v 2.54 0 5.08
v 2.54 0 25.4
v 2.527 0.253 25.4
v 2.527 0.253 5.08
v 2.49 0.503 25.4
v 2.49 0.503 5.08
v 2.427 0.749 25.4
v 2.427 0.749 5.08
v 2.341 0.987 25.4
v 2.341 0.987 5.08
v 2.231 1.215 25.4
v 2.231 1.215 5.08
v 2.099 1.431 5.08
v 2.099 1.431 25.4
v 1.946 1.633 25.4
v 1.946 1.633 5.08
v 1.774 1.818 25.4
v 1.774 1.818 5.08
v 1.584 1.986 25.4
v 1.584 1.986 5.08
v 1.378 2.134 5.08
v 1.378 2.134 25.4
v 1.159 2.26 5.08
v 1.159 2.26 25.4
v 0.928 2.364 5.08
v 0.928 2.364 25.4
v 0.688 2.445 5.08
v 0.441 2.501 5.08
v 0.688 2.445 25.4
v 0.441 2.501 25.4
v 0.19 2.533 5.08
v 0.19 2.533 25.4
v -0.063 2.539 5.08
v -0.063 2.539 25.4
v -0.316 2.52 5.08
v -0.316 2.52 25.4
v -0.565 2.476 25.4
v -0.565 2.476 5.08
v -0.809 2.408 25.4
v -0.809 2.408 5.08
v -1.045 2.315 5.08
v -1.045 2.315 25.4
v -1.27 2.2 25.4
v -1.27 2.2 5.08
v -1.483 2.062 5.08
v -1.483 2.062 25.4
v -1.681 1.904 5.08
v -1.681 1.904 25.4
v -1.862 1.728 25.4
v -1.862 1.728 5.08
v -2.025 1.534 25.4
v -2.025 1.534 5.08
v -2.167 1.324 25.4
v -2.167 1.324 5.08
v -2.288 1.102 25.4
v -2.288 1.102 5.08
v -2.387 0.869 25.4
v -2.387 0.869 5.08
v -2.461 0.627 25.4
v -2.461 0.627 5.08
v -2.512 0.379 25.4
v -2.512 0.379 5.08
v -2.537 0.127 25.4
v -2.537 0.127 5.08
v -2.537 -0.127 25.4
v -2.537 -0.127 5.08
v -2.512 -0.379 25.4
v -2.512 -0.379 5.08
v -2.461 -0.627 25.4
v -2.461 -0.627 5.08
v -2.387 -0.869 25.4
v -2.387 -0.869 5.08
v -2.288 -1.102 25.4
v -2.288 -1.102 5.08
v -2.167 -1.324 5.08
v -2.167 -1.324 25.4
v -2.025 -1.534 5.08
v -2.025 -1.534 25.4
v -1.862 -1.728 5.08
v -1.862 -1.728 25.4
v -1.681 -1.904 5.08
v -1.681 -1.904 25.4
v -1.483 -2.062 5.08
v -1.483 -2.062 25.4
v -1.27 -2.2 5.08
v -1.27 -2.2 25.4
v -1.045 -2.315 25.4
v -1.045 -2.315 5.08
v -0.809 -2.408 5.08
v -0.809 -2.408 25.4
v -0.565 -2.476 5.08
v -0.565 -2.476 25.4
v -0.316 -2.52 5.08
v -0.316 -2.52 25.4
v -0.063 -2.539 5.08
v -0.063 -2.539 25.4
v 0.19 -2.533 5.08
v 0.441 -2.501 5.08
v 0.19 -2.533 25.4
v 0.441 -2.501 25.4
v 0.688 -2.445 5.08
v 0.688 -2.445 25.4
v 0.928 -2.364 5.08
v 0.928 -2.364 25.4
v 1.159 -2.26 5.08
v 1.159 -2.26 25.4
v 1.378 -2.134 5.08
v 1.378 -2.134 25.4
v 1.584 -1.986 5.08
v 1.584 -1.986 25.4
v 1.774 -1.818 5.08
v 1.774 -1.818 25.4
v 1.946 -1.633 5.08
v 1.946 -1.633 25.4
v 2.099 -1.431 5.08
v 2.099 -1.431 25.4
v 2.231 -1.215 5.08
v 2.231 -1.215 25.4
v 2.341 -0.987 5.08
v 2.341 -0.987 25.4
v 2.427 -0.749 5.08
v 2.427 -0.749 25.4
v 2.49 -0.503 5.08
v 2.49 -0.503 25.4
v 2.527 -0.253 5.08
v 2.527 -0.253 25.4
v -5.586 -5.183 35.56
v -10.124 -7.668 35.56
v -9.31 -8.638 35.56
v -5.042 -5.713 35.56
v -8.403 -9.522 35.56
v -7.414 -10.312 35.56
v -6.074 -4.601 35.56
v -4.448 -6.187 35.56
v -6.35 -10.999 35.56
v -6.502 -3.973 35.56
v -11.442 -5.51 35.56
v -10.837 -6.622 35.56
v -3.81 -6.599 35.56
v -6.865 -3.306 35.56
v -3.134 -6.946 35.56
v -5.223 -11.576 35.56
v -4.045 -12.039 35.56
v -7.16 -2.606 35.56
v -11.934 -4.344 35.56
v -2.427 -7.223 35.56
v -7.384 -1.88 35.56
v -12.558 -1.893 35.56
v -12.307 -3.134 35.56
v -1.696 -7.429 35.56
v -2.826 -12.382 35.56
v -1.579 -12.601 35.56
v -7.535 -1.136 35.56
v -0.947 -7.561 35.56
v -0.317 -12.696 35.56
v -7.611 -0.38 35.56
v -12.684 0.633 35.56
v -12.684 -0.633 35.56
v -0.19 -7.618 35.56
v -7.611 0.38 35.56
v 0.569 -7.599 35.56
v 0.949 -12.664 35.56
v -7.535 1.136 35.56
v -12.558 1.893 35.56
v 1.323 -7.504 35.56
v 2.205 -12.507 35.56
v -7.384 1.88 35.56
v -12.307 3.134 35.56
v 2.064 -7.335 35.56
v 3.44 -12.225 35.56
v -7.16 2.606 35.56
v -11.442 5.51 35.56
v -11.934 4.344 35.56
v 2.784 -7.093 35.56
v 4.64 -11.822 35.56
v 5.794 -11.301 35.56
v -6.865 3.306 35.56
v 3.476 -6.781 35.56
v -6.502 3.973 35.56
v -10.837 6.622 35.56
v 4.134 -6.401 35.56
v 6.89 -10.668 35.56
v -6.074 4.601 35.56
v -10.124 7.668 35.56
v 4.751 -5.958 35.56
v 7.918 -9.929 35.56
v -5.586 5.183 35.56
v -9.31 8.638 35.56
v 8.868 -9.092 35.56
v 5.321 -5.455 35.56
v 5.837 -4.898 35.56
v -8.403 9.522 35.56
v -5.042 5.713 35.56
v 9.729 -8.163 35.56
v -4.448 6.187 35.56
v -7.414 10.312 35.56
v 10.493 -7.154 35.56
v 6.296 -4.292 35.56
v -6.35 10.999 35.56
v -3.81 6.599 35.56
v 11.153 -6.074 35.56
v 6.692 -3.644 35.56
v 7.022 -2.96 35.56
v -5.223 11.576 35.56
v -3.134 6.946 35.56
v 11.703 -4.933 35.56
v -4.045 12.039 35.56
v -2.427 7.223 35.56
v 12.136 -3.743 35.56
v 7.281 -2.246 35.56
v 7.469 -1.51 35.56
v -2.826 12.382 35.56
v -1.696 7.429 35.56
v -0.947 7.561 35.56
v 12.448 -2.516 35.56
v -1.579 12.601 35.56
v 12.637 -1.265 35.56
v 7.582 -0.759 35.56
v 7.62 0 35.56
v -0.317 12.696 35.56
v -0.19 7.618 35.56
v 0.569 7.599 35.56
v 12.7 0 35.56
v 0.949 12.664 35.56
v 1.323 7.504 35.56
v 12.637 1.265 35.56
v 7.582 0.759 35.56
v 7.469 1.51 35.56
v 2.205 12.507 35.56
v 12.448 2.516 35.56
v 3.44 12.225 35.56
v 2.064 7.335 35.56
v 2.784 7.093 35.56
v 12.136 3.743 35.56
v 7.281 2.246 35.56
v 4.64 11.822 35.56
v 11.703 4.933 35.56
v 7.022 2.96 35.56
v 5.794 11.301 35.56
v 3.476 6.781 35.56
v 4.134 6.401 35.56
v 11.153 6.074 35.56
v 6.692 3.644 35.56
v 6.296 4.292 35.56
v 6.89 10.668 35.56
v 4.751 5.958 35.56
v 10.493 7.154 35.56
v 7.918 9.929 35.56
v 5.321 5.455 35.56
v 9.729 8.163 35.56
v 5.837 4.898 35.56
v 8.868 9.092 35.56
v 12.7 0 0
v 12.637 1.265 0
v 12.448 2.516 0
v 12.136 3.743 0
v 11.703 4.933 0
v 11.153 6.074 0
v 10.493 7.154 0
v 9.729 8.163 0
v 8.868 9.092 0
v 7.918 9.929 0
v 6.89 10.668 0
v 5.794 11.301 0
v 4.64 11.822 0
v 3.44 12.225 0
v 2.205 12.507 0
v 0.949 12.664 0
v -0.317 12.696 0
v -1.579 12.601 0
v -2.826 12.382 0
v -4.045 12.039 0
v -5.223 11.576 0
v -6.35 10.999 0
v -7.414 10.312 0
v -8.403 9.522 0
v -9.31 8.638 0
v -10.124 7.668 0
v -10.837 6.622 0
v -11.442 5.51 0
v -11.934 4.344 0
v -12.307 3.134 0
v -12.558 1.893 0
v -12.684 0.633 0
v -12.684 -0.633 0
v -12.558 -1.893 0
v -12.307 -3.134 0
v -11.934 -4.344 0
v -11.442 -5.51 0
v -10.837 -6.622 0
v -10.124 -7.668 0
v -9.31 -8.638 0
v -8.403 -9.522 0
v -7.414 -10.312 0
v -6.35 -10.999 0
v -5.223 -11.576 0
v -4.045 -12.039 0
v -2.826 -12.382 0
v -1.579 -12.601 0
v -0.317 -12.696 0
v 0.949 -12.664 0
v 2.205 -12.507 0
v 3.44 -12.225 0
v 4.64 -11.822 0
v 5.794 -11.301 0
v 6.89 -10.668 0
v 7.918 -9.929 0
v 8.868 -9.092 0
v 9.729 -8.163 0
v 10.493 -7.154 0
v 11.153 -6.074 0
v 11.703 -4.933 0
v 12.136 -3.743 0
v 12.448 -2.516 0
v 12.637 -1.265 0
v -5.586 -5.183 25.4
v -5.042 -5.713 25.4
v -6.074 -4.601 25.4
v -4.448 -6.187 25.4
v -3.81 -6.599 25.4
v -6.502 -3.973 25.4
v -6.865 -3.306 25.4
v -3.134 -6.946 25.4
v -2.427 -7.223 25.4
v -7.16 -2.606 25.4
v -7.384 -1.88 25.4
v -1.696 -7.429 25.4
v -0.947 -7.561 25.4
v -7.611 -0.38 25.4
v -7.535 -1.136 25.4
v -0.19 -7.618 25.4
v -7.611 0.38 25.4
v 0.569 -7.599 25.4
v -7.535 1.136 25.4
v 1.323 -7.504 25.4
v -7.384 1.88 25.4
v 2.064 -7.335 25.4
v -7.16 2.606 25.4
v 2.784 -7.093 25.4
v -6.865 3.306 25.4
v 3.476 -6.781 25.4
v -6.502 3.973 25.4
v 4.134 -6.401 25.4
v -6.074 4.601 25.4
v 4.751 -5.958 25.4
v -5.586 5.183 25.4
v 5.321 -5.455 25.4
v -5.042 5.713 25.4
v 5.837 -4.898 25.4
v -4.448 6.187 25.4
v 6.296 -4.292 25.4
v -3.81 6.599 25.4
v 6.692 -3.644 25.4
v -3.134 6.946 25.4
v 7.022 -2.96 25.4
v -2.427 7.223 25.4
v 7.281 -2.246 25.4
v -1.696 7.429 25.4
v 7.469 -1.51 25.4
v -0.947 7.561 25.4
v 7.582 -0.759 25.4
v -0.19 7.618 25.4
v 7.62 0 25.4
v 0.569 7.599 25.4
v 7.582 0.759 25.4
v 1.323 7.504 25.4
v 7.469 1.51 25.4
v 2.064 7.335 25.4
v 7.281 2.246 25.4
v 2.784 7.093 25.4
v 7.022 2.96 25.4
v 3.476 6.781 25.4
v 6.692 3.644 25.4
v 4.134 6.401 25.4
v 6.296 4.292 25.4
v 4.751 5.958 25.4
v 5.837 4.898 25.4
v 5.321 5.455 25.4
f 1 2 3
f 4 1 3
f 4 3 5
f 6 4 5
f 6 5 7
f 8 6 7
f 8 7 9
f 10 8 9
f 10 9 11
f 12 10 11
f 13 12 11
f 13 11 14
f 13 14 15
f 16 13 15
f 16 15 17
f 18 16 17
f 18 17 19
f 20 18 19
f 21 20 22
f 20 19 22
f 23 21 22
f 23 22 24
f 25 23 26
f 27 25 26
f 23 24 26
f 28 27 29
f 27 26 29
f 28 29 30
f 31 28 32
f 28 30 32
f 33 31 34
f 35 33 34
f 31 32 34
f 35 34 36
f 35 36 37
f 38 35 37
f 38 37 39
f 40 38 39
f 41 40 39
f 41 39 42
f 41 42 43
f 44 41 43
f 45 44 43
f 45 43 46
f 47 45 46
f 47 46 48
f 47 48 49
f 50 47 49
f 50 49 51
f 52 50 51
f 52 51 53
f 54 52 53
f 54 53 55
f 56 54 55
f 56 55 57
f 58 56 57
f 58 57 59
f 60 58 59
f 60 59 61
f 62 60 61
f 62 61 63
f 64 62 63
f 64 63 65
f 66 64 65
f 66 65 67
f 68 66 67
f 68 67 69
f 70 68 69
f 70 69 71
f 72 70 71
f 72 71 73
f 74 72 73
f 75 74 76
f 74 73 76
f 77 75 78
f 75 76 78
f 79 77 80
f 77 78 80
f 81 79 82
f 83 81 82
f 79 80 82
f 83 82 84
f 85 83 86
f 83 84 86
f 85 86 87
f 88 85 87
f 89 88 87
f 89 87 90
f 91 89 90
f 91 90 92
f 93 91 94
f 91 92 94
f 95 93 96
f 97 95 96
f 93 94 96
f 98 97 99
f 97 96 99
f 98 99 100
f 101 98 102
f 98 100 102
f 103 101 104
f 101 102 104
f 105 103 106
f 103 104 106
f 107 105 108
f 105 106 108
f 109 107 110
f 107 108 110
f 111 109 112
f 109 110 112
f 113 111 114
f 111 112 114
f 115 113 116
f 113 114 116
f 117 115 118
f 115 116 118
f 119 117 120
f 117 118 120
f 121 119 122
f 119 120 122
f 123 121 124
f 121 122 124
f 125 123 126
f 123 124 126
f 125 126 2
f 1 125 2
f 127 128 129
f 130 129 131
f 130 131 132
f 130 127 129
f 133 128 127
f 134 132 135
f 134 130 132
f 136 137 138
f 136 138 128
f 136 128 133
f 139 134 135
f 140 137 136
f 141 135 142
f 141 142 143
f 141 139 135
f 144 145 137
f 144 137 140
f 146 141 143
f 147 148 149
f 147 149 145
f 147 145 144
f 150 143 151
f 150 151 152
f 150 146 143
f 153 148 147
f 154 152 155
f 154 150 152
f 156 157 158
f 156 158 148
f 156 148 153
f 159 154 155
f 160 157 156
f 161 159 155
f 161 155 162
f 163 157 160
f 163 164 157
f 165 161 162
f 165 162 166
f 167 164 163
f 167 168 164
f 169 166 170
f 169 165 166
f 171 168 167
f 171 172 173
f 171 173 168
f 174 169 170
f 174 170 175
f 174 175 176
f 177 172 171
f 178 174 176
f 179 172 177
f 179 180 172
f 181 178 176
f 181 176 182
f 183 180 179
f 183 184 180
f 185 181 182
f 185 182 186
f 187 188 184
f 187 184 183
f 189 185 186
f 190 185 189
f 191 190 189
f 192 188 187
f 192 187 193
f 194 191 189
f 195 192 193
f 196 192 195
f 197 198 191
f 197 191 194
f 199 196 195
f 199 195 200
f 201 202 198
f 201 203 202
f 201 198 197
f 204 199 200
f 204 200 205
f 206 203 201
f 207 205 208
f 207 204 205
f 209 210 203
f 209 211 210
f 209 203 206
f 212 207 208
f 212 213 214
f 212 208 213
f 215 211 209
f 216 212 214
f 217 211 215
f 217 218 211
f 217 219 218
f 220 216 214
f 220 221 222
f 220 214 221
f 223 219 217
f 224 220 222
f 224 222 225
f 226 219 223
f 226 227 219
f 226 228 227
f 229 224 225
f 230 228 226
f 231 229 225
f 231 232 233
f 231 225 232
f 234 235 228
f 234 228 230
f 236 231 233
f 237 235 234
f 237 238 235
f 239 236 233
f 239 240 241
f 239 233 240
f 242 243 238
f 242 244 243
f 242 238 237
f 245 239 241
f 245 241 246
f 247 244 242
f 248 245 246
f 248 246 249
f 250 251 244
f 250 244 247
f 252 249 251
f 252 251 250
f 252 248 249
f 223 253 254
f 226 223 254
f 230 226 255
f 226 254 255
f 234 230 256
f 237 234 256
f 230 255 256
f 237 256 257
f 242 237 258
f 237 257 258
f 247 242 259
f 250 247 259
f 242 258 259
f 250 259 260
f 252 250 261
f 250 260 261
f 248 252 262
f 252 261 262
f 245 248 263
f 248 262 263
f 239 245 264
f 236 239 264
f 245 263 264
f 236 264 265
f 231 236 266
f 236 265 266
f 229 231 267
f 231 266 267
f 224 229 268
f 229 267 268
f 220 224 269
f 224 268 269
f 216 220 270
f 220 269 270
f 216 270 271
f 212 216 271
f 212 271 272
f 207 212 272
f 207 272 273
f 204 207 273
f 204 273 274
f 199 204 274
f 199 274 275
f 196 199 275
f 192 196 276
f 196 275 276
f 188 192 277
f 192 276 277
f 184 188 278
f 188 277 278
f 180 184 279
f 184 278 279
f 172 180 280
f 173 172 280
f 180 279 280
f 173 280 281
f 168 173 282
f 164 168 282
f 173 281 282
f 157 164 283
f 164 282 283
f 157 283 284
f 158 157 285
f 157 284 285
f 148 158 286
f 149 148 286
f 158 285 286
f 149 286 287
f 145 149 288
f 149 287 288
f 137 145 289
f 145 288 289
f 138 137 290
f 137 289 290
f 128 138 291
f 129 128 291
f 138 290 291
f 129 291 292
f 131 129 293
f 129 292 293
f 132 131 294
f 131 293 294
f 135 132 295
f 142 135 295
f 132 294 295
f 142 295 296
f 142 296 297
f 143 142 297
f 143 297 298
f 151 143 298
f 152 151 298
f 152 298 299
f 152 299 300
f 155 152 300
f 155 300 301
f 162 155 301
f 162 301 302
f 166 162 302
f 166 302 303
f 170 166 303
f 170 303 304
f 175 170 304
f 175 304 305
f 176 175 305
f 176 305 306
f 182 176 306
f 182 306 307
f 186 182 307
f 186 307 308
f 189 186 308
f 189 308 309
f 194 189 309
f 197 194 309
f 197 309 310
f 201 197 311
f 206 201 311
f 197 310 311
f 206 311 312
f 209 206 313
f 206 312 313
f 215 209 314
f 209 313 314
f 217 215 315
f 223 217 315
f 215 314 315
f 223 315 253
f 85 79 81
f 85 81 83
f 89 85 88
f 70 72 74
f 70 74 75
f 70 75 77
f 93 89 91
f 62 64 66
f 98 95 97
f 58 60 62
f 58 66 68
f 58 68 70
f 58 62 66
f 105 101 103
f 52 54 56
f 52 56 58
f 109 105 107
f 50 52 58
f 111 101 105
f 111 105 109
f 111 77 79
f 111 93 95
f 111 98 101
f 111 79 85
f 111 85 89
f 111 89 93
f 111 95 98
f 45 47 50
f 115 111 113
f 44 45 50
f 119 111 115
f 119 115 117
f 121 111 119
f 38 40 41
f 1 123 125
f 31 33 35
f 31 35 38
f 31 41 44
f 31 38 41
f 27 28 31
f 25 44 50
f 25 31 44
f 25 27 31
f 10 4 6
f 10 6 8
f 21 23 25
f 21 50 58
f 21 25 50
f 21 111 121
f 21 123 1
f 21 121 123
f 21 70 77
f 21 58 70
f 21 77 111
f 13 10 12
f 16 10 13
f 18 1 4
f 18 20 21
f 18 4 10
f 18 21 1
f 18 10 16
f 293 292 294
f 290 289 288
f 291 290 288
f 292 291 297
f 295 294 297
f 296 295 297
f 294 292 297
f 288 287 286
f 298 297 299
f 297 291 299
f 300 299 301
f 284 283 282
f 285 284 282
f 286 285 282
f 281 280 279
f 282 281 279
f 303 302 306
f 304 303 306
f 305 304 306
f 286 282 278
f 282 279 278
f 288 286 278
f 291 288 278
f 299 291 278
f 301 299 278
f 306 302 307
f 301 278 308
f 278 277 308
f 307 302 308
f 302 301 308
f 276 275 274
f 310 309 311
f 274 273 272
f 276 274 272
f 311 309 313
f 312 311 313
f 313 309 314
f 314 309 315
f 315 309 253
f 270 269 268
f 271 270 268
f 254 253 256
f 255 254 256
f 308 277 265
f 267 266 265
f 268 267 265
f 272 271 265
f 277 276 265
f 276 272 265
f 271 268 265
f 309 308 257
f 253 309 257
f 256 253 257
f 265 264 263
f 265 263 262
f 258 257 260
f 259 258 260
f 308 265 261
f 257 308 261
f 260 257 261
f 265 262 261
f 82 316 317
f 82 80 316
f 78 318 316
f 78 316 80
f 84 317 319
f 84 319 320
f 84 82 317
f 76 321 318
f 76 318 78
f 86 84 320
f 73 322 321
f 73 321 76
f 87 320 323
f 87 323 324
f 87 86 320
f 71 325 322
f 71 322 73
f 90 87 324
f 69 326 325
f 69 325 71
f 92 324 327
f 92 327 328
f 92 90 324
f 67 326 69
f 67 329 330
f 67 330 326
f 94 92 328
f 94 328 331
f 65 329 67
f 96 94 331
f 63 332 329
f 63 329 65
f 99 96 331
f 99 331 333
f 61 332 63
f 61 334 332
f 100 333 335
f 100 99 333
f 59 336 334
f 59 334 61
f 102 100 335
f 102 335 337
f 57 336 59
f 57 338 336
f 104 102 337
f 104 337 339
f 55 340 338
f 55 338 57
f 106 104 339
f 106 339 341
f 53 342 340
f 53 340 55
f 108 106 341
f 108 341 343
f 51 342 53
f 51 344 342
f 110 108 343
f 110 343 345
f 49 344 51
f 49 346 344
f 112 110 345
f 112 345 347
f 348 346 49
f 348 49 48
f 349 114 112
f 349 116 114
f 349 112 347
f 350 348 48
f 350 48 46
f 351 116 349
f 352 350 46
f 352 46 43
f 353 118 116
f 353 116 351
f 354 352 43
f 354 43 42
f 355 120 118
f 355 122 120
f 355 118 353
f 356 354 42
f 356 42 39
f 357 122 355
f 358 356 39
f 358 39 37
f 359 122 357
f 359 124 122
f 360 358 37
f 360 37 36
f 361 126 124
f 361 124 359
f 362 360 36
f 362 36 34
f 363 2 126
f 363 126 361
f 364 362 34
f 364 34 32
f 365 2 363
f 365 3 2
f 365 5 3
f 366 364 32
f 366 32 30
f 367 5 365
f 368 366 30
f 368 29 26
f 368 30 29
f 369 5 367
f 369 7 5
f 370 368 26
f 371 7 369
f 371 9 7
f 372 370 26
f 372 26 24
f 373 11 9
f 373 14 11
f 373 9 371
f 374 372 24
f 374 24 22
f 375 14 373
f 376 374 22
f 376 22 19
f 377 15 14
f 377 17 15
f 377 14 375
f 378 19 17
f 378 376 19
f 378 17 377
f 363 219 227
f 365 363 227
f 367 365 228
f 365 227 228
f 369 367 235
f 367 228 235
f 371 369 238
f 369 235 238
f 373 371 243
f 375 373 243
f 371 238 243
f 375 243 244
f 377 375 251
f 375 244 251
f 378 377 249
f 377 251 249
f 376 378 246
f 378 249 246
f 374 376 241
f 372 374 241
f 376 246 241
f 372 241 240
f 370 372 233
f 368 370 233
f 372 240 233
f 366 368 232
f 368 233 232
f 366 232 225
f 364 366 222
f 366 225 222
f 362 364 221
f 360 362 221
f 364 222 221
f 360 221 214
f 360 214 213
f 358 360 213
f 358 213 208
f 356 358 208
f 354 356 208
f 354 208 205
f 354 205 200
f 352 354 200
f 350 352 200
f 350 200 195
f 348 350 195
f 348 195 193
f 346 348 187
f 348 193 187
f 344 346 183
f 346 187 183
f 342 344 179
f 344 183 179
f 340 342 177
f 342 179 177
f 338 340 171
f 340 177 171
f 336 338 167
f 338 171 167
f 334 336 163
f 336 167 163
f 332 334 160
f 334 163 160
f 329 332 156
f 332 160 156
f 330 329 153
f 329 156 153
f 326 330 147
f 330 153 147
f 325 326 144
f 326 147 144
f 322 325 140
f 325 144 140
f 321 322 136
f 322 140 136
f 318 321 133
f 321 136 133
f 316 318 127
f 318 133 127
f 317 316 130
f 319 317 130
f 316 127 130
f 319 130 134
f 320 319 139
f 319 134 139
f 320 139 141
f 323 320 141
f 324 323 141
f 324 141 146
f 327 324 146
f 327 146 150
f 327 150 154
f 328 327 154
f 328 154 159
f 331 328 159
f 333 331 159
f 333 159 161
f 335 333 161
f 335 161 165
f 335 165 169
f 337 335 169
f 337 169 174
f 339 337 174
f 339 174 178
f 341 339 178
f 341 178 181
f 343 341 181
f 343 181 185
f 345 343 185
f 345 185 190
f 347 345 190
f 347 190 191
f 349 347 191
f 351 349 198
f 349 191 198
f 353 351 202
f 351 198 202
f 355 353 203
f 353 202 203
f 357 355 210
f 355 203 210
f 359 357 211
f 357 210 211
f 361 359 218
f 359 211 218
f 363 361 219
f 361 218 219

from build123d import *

# Parameters (mm, degrees)
F0_R      = 12.7
F1_DEPTH  = 35.56
F2_R      = 7.62
F2_R_2    = 2.54
F3_DEPTH  = 10.16
F3_FACE_R = 2.54
F4_DEPTH  = 30.48


with BuildPart() as f1:
    # F0 (on Top) → F1 (new body)
    with BuildSketch(Plane.XY):
        Circle(F0_R)
    extrude(amount=F1_DEPTH)

    # F2 (on face) → F3 (cut)
    with BuildSketch(Plane.XY.offset(35.56)):
        Circle(F2_R)
        Circle(F2_R_2, mode=Mode.SUBTRACT)
    extrude(amount=-F3_DEPTH, mode=Mode.SUBTRACT)

    # F3_face (on face) → F4 (cut)
    with BuildSketch(Plane.XY.offset(35.56)):
        Circle(F3_FACE_R)
    extrude(amount=-F4_DEPTH, mode=Mode.SUBTRACT)


solid = f1.part
